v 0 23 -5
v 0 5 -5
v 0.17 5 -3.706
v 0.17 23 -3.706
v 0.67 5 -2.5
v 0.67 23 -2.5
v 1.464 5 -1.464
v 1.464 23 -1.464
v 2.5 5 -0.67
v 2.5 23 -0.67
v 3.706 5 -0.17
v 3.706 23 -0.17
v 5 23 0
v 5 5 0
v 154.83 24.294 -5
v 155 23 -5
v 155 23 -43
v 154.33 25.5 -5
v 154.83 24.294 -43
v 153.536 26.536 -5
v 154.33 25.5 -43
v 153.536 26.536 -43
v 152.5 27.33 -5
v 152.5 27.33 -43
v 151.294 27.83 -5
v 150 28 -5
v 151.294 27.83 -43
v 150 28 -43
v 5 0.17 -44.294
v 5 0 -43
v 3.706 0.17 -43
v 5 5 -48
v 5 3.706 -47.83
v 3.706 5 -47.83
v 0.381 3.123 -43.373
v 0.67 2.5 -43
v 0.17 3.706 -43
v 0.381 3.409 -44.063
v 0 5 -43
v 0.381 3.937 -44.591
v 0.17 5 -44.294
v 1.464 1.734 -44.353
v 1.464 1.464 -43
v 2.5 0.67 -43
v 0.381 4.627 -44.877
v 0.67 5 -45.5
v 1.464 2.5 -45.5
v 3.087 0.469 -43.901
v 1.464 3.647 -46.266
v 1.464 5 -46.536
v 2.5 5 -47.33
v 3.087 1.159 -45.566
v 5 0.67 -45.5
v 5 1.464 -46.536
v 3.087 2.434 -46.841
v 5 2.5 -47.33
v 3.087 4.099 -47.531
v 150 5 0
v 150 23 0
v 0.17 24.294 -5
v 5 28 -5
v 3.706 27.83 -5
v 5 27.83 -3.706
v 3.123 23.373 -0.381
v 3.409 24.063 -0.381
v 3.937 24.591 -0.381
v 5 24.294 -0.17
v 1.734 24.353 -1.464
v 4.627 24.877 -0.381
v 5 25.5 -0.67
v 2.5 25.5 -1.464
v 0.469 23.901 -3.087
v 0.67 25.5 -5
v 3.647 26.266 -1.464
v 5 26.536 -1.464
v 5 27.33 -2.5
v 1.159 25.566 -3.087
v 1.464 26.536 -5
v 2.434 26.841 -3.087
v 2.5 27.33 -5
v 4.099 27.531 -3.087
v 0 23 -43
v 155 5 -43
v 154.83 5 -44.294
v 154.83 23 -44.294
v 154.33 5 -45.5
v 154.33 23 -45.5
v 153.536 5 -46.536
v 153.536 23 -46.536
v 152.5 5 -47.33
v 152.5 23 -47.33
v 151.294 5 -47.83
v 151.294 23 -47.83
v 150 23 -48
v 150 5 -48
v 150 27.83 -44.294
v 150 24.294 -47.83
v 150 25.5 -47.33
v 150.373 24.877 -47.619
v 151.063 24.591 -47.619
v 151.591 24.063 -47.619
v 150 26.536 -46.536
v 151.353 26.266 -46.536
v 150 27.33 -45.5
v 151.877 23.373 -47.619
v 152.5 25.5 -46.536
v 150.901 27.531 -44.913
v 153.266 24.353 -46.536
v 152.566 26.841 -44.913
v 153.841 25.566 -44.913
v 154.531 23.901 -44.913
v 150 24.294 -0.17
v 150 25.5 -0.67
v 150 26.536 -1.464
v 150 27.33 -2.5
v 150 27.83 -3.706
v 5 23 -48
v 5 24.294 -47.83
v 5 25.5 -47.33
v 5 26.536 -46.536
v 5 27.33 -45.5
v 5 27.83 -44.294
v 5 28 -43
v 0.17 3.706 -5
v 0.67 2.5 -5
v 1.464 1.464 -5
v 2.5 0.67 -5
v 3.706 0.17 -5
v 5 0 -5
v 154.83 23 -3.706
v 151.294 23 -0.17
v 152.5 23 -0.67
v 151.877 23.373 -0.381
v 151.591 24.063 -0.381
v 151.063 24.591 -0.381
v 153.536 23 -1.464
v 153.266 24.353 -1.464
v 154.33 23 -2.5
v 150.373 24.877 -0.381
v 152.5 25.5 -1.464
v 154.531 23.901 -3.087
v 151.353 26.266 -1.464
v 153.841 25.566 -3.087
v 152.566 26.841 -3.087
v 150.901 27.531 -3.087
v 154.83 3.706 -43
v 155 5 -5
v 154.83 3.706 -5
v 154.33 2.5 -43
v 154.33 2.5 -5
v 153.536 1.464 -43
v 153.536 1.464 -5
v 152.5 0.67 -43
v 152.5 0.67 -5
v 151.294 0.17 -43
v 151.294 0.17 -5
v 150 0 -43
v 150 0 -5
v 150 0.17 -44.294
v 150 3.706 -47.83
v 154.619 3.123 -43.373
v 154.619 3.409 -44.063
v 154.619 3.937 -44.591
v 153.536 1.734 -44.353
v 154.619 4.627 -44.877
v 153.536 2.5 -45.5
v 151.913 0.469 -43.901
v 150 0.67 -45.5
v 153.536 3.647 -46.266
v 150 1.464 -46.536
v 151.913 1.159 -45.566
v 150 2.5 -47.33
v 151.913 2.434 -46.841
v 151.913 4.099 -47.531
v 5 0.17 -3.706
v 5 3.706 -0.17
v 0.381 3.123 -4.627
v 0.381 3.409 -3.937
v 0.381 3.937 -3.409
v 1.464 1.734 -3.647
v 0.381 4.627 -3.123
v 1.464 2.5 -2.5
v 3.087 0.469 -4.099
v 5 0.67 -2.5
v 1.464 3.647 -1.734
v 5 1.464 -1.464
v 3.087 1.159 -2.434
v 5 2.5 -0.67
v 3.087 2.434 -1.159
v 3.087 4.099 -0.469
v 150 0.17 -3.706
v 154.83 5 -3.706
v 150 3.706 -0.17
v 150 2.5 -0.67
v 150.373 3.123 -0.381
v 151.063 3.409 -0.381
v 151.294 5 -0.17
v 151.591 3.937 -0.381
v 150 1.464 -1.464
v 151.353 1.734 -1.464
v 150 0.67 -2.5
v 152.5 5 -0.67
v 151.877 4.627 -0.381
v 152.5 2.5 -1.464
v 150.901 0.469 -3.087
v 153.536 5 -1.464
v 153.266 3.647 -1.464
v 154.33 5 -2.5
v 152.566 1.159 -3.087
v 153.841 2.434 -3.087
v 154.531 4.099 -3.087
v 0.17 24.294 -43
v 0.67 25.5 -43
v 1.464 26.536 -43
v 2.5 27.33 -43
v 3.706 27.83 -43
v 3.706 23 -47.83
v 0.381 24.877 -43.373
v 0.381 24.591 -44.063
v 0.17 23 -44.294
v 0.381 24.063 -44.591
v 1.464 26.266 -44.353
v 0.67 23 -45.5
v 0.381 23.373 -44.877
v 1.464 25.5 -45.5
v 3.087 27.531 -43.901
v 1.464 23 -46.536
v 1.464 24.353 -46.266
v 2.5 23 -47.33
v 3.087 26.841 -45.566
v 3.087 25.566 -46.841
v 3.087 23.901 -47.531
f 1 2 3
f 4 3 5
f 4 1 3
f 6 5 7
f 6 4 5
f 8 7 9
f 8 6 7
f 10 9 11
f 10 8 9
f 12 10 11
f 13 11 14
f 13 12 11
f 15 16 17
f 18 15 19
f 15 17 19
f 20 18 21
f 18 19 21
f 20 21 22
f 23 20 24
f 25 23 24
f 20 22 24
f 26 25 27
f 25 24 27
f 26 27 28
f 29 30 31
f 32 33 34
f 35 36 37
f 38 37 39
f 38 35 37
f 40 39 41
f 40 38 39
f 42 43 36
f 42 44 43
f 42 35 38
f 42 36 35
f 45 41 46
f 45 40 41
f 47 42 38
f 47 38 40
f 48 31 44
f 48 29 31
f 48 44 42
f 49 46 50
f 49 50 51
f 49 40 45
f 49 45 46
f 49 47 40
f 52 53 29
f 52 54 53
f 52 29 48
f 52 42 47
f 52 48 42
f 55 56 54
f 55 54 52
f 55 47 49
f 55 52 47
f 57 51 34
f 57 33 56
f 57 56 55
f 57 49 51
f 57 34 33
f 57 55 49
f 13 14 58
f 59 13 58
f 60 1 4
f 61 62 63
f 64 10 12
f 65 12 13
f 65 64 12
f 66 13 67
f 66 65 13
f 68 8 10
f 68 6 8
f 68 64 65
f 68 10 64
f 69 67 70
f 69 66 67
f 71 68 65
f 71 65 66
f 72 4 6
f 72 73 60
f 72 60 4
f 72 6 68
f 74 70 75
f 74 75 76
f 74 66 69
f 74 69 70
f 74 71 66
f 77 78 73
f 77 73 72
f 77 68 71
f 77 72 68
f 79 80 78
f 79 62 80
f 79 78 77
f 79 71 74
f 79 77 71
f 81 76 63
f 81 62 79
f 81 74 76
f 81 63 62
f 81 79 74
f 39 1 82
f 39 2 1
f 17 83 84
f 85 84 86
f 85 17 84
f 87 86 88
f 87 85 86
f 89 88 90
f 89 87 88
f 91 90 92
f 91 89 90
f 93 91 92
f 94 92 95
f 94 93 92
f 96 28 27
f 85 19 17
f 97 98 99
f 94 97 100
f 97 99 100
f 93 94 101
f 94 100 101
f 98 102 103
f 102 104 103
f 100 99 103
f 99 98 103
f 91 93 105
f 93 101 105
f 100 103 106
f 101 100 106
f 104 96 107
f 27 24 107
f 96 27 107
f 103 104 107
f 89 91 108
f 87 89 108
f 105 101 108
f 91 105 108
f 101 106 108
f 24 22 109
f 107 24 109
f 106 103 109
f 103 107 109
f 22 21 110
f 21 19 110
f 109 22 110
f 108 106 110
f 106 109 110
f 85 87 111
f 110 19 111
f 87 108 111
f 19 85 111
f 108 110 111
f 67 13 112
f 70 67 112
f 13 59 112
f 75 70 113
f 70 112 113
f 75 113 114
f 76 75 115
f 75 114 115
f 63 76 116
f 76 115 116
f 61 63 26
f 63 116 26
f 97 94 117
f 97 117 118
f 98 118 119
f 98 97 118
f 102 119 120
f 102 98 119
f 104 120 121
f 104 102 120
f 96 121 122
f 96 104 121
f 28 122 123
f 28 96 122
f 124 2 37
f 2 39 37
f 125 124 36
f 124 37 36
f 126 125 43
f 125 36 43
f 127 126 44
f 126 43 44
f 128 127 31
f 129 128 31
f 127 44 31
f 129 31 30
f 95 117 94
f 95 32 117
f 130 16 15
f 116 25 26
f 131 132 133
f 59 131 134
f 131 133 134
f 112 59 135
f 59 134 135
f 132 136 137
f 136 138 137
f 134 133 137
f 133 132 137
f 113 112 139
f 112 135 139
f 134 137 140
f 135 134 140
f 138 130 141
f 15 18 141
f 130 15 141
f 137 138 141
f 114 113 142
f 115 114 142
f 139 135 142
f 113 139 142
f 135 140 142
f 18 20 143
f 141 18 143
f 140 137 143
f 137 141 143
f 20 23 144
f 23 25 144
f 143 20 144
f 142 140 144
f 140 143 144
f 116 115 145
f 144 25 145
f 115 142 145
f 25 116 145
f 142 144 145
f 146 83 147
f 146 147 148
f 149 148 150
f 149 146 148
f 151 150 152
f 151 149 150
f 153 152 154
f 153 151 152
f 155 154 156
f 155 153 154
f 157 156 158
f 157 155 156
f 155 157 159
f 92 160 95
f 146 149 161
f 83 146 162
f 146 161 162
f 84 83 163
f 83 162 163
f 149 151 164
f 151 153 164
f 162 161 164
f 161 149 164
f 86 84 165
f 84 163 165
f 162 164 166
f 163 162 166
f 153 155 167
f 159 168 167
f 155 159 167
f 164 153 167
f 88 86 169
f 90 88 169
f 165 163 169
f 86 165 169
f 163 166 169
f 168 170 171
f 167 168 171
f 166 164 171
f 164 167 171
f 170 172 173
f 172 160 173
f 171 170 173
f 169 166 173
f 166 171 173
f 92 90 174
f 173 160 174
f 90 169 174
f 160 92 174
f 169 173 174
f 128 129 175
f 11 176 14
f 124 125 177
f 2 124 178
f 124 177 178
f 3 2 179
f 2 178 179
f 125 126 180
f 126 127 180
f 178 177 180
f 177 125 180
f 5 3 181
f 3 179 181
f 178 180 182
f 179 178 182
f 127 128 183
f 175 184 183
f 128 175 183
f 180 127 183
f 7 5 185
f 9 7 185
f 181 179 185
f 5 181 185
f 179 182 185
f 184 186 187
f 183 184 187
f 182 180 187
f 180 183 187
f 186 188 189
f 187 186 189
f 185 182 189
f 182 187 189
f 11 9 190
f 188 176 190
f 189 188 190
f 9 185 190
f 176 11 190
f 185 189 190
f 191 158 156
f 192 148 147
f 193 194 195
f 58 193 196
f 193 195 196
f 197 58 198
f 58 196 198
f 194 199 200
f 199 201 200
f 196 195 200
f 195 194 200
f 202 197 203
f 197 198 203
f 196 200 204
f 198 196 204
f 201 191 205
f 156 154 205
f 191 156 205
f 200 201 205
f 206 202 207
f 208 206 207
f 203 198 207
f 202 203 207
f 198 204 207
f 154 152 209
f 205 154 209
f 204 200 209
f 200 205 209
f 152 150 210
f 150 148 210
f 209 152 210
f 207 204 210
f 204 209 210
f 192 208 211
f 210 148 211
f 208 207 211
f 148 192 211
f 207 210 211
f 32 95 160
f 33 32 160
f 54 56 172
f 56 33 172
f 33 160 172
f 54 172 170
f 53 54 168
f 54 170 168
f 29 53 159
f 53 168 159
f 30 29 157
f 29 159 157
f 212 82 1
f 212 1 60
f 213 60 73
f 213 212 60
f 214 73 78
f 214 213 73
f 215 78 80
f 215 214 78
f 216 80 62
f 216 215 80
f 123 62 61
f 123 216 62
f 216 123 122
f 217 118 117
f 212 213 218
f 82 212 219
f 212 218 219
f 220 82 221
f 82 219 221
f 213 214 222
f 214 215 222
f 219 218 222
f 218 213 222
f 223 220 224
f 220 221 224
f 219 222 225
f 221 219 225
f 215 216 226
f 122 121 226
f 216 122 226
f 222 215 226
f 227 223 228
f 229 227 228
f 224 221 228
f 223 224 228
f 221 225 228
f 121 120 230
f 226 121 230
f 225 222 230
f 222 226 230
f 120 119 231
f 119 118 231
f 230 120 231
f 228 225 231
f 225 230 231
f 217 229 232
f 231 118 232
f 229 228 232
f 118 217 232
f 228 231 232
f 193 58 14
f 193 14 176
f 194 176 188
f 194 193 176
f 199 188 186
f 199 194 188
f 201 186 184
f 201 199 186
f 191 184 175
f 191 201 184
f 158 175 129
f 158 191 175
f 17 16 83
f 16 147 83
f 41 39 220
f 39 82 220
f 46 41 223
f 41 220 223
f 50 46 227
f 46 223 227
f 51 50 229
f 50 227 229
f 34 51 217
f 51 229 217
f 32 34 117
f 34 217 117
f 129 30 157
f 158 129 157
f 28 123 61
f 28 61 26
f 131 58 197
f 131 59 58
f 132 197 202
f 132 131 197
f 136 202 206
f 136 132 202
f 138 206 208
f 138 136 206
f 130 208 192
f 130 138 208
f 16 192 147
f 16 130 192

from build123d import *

# Parameters (mm, degrees)
SKIZZE1_W                       = 155
SKIZZE1_H                       = 48
AUFSATZ_LINEAR_AUSTRAGEN1_DEPTH = 28
VERRUNDUNG1_R                   = 5


with BuildPart() as part:
    # Skizze1 → Aufsatz-Linear austragen1 (new body)
    with BuildSketch(Plane(origin=(0, 0, 0), x_dir=(1, 0, 0), z_dir=(0, 1, 0))):
        with Locations((77.5, 24)):
            Rectangle(SKIZZE1_W, SKIZZE1_H)
    extrude(amount=AUFSATZ_LINEAR_AUSTRAGEN1_DEPTH)

    # Verrundung1
    verrundung1_edges = [part.edges().sort_by_distance(p)[0] for p in [
        (155, 28, -24),
        (77.5, 28, -48),
        (0, 28, -24),
        (77.5, 0, -48),
        (155, 0, -24),
        (77.5, 0, 0),
        (0, 0, -24),
        (0, 14, -48),
        (155, 14, -48),
        (155, 14, 0),
        (0, 14, 0),
        (77.5, 28, 0),
    ]]
    fillet(verrundung1_edges, radius=VERRUNDUNG1_R)


solid = part.part
